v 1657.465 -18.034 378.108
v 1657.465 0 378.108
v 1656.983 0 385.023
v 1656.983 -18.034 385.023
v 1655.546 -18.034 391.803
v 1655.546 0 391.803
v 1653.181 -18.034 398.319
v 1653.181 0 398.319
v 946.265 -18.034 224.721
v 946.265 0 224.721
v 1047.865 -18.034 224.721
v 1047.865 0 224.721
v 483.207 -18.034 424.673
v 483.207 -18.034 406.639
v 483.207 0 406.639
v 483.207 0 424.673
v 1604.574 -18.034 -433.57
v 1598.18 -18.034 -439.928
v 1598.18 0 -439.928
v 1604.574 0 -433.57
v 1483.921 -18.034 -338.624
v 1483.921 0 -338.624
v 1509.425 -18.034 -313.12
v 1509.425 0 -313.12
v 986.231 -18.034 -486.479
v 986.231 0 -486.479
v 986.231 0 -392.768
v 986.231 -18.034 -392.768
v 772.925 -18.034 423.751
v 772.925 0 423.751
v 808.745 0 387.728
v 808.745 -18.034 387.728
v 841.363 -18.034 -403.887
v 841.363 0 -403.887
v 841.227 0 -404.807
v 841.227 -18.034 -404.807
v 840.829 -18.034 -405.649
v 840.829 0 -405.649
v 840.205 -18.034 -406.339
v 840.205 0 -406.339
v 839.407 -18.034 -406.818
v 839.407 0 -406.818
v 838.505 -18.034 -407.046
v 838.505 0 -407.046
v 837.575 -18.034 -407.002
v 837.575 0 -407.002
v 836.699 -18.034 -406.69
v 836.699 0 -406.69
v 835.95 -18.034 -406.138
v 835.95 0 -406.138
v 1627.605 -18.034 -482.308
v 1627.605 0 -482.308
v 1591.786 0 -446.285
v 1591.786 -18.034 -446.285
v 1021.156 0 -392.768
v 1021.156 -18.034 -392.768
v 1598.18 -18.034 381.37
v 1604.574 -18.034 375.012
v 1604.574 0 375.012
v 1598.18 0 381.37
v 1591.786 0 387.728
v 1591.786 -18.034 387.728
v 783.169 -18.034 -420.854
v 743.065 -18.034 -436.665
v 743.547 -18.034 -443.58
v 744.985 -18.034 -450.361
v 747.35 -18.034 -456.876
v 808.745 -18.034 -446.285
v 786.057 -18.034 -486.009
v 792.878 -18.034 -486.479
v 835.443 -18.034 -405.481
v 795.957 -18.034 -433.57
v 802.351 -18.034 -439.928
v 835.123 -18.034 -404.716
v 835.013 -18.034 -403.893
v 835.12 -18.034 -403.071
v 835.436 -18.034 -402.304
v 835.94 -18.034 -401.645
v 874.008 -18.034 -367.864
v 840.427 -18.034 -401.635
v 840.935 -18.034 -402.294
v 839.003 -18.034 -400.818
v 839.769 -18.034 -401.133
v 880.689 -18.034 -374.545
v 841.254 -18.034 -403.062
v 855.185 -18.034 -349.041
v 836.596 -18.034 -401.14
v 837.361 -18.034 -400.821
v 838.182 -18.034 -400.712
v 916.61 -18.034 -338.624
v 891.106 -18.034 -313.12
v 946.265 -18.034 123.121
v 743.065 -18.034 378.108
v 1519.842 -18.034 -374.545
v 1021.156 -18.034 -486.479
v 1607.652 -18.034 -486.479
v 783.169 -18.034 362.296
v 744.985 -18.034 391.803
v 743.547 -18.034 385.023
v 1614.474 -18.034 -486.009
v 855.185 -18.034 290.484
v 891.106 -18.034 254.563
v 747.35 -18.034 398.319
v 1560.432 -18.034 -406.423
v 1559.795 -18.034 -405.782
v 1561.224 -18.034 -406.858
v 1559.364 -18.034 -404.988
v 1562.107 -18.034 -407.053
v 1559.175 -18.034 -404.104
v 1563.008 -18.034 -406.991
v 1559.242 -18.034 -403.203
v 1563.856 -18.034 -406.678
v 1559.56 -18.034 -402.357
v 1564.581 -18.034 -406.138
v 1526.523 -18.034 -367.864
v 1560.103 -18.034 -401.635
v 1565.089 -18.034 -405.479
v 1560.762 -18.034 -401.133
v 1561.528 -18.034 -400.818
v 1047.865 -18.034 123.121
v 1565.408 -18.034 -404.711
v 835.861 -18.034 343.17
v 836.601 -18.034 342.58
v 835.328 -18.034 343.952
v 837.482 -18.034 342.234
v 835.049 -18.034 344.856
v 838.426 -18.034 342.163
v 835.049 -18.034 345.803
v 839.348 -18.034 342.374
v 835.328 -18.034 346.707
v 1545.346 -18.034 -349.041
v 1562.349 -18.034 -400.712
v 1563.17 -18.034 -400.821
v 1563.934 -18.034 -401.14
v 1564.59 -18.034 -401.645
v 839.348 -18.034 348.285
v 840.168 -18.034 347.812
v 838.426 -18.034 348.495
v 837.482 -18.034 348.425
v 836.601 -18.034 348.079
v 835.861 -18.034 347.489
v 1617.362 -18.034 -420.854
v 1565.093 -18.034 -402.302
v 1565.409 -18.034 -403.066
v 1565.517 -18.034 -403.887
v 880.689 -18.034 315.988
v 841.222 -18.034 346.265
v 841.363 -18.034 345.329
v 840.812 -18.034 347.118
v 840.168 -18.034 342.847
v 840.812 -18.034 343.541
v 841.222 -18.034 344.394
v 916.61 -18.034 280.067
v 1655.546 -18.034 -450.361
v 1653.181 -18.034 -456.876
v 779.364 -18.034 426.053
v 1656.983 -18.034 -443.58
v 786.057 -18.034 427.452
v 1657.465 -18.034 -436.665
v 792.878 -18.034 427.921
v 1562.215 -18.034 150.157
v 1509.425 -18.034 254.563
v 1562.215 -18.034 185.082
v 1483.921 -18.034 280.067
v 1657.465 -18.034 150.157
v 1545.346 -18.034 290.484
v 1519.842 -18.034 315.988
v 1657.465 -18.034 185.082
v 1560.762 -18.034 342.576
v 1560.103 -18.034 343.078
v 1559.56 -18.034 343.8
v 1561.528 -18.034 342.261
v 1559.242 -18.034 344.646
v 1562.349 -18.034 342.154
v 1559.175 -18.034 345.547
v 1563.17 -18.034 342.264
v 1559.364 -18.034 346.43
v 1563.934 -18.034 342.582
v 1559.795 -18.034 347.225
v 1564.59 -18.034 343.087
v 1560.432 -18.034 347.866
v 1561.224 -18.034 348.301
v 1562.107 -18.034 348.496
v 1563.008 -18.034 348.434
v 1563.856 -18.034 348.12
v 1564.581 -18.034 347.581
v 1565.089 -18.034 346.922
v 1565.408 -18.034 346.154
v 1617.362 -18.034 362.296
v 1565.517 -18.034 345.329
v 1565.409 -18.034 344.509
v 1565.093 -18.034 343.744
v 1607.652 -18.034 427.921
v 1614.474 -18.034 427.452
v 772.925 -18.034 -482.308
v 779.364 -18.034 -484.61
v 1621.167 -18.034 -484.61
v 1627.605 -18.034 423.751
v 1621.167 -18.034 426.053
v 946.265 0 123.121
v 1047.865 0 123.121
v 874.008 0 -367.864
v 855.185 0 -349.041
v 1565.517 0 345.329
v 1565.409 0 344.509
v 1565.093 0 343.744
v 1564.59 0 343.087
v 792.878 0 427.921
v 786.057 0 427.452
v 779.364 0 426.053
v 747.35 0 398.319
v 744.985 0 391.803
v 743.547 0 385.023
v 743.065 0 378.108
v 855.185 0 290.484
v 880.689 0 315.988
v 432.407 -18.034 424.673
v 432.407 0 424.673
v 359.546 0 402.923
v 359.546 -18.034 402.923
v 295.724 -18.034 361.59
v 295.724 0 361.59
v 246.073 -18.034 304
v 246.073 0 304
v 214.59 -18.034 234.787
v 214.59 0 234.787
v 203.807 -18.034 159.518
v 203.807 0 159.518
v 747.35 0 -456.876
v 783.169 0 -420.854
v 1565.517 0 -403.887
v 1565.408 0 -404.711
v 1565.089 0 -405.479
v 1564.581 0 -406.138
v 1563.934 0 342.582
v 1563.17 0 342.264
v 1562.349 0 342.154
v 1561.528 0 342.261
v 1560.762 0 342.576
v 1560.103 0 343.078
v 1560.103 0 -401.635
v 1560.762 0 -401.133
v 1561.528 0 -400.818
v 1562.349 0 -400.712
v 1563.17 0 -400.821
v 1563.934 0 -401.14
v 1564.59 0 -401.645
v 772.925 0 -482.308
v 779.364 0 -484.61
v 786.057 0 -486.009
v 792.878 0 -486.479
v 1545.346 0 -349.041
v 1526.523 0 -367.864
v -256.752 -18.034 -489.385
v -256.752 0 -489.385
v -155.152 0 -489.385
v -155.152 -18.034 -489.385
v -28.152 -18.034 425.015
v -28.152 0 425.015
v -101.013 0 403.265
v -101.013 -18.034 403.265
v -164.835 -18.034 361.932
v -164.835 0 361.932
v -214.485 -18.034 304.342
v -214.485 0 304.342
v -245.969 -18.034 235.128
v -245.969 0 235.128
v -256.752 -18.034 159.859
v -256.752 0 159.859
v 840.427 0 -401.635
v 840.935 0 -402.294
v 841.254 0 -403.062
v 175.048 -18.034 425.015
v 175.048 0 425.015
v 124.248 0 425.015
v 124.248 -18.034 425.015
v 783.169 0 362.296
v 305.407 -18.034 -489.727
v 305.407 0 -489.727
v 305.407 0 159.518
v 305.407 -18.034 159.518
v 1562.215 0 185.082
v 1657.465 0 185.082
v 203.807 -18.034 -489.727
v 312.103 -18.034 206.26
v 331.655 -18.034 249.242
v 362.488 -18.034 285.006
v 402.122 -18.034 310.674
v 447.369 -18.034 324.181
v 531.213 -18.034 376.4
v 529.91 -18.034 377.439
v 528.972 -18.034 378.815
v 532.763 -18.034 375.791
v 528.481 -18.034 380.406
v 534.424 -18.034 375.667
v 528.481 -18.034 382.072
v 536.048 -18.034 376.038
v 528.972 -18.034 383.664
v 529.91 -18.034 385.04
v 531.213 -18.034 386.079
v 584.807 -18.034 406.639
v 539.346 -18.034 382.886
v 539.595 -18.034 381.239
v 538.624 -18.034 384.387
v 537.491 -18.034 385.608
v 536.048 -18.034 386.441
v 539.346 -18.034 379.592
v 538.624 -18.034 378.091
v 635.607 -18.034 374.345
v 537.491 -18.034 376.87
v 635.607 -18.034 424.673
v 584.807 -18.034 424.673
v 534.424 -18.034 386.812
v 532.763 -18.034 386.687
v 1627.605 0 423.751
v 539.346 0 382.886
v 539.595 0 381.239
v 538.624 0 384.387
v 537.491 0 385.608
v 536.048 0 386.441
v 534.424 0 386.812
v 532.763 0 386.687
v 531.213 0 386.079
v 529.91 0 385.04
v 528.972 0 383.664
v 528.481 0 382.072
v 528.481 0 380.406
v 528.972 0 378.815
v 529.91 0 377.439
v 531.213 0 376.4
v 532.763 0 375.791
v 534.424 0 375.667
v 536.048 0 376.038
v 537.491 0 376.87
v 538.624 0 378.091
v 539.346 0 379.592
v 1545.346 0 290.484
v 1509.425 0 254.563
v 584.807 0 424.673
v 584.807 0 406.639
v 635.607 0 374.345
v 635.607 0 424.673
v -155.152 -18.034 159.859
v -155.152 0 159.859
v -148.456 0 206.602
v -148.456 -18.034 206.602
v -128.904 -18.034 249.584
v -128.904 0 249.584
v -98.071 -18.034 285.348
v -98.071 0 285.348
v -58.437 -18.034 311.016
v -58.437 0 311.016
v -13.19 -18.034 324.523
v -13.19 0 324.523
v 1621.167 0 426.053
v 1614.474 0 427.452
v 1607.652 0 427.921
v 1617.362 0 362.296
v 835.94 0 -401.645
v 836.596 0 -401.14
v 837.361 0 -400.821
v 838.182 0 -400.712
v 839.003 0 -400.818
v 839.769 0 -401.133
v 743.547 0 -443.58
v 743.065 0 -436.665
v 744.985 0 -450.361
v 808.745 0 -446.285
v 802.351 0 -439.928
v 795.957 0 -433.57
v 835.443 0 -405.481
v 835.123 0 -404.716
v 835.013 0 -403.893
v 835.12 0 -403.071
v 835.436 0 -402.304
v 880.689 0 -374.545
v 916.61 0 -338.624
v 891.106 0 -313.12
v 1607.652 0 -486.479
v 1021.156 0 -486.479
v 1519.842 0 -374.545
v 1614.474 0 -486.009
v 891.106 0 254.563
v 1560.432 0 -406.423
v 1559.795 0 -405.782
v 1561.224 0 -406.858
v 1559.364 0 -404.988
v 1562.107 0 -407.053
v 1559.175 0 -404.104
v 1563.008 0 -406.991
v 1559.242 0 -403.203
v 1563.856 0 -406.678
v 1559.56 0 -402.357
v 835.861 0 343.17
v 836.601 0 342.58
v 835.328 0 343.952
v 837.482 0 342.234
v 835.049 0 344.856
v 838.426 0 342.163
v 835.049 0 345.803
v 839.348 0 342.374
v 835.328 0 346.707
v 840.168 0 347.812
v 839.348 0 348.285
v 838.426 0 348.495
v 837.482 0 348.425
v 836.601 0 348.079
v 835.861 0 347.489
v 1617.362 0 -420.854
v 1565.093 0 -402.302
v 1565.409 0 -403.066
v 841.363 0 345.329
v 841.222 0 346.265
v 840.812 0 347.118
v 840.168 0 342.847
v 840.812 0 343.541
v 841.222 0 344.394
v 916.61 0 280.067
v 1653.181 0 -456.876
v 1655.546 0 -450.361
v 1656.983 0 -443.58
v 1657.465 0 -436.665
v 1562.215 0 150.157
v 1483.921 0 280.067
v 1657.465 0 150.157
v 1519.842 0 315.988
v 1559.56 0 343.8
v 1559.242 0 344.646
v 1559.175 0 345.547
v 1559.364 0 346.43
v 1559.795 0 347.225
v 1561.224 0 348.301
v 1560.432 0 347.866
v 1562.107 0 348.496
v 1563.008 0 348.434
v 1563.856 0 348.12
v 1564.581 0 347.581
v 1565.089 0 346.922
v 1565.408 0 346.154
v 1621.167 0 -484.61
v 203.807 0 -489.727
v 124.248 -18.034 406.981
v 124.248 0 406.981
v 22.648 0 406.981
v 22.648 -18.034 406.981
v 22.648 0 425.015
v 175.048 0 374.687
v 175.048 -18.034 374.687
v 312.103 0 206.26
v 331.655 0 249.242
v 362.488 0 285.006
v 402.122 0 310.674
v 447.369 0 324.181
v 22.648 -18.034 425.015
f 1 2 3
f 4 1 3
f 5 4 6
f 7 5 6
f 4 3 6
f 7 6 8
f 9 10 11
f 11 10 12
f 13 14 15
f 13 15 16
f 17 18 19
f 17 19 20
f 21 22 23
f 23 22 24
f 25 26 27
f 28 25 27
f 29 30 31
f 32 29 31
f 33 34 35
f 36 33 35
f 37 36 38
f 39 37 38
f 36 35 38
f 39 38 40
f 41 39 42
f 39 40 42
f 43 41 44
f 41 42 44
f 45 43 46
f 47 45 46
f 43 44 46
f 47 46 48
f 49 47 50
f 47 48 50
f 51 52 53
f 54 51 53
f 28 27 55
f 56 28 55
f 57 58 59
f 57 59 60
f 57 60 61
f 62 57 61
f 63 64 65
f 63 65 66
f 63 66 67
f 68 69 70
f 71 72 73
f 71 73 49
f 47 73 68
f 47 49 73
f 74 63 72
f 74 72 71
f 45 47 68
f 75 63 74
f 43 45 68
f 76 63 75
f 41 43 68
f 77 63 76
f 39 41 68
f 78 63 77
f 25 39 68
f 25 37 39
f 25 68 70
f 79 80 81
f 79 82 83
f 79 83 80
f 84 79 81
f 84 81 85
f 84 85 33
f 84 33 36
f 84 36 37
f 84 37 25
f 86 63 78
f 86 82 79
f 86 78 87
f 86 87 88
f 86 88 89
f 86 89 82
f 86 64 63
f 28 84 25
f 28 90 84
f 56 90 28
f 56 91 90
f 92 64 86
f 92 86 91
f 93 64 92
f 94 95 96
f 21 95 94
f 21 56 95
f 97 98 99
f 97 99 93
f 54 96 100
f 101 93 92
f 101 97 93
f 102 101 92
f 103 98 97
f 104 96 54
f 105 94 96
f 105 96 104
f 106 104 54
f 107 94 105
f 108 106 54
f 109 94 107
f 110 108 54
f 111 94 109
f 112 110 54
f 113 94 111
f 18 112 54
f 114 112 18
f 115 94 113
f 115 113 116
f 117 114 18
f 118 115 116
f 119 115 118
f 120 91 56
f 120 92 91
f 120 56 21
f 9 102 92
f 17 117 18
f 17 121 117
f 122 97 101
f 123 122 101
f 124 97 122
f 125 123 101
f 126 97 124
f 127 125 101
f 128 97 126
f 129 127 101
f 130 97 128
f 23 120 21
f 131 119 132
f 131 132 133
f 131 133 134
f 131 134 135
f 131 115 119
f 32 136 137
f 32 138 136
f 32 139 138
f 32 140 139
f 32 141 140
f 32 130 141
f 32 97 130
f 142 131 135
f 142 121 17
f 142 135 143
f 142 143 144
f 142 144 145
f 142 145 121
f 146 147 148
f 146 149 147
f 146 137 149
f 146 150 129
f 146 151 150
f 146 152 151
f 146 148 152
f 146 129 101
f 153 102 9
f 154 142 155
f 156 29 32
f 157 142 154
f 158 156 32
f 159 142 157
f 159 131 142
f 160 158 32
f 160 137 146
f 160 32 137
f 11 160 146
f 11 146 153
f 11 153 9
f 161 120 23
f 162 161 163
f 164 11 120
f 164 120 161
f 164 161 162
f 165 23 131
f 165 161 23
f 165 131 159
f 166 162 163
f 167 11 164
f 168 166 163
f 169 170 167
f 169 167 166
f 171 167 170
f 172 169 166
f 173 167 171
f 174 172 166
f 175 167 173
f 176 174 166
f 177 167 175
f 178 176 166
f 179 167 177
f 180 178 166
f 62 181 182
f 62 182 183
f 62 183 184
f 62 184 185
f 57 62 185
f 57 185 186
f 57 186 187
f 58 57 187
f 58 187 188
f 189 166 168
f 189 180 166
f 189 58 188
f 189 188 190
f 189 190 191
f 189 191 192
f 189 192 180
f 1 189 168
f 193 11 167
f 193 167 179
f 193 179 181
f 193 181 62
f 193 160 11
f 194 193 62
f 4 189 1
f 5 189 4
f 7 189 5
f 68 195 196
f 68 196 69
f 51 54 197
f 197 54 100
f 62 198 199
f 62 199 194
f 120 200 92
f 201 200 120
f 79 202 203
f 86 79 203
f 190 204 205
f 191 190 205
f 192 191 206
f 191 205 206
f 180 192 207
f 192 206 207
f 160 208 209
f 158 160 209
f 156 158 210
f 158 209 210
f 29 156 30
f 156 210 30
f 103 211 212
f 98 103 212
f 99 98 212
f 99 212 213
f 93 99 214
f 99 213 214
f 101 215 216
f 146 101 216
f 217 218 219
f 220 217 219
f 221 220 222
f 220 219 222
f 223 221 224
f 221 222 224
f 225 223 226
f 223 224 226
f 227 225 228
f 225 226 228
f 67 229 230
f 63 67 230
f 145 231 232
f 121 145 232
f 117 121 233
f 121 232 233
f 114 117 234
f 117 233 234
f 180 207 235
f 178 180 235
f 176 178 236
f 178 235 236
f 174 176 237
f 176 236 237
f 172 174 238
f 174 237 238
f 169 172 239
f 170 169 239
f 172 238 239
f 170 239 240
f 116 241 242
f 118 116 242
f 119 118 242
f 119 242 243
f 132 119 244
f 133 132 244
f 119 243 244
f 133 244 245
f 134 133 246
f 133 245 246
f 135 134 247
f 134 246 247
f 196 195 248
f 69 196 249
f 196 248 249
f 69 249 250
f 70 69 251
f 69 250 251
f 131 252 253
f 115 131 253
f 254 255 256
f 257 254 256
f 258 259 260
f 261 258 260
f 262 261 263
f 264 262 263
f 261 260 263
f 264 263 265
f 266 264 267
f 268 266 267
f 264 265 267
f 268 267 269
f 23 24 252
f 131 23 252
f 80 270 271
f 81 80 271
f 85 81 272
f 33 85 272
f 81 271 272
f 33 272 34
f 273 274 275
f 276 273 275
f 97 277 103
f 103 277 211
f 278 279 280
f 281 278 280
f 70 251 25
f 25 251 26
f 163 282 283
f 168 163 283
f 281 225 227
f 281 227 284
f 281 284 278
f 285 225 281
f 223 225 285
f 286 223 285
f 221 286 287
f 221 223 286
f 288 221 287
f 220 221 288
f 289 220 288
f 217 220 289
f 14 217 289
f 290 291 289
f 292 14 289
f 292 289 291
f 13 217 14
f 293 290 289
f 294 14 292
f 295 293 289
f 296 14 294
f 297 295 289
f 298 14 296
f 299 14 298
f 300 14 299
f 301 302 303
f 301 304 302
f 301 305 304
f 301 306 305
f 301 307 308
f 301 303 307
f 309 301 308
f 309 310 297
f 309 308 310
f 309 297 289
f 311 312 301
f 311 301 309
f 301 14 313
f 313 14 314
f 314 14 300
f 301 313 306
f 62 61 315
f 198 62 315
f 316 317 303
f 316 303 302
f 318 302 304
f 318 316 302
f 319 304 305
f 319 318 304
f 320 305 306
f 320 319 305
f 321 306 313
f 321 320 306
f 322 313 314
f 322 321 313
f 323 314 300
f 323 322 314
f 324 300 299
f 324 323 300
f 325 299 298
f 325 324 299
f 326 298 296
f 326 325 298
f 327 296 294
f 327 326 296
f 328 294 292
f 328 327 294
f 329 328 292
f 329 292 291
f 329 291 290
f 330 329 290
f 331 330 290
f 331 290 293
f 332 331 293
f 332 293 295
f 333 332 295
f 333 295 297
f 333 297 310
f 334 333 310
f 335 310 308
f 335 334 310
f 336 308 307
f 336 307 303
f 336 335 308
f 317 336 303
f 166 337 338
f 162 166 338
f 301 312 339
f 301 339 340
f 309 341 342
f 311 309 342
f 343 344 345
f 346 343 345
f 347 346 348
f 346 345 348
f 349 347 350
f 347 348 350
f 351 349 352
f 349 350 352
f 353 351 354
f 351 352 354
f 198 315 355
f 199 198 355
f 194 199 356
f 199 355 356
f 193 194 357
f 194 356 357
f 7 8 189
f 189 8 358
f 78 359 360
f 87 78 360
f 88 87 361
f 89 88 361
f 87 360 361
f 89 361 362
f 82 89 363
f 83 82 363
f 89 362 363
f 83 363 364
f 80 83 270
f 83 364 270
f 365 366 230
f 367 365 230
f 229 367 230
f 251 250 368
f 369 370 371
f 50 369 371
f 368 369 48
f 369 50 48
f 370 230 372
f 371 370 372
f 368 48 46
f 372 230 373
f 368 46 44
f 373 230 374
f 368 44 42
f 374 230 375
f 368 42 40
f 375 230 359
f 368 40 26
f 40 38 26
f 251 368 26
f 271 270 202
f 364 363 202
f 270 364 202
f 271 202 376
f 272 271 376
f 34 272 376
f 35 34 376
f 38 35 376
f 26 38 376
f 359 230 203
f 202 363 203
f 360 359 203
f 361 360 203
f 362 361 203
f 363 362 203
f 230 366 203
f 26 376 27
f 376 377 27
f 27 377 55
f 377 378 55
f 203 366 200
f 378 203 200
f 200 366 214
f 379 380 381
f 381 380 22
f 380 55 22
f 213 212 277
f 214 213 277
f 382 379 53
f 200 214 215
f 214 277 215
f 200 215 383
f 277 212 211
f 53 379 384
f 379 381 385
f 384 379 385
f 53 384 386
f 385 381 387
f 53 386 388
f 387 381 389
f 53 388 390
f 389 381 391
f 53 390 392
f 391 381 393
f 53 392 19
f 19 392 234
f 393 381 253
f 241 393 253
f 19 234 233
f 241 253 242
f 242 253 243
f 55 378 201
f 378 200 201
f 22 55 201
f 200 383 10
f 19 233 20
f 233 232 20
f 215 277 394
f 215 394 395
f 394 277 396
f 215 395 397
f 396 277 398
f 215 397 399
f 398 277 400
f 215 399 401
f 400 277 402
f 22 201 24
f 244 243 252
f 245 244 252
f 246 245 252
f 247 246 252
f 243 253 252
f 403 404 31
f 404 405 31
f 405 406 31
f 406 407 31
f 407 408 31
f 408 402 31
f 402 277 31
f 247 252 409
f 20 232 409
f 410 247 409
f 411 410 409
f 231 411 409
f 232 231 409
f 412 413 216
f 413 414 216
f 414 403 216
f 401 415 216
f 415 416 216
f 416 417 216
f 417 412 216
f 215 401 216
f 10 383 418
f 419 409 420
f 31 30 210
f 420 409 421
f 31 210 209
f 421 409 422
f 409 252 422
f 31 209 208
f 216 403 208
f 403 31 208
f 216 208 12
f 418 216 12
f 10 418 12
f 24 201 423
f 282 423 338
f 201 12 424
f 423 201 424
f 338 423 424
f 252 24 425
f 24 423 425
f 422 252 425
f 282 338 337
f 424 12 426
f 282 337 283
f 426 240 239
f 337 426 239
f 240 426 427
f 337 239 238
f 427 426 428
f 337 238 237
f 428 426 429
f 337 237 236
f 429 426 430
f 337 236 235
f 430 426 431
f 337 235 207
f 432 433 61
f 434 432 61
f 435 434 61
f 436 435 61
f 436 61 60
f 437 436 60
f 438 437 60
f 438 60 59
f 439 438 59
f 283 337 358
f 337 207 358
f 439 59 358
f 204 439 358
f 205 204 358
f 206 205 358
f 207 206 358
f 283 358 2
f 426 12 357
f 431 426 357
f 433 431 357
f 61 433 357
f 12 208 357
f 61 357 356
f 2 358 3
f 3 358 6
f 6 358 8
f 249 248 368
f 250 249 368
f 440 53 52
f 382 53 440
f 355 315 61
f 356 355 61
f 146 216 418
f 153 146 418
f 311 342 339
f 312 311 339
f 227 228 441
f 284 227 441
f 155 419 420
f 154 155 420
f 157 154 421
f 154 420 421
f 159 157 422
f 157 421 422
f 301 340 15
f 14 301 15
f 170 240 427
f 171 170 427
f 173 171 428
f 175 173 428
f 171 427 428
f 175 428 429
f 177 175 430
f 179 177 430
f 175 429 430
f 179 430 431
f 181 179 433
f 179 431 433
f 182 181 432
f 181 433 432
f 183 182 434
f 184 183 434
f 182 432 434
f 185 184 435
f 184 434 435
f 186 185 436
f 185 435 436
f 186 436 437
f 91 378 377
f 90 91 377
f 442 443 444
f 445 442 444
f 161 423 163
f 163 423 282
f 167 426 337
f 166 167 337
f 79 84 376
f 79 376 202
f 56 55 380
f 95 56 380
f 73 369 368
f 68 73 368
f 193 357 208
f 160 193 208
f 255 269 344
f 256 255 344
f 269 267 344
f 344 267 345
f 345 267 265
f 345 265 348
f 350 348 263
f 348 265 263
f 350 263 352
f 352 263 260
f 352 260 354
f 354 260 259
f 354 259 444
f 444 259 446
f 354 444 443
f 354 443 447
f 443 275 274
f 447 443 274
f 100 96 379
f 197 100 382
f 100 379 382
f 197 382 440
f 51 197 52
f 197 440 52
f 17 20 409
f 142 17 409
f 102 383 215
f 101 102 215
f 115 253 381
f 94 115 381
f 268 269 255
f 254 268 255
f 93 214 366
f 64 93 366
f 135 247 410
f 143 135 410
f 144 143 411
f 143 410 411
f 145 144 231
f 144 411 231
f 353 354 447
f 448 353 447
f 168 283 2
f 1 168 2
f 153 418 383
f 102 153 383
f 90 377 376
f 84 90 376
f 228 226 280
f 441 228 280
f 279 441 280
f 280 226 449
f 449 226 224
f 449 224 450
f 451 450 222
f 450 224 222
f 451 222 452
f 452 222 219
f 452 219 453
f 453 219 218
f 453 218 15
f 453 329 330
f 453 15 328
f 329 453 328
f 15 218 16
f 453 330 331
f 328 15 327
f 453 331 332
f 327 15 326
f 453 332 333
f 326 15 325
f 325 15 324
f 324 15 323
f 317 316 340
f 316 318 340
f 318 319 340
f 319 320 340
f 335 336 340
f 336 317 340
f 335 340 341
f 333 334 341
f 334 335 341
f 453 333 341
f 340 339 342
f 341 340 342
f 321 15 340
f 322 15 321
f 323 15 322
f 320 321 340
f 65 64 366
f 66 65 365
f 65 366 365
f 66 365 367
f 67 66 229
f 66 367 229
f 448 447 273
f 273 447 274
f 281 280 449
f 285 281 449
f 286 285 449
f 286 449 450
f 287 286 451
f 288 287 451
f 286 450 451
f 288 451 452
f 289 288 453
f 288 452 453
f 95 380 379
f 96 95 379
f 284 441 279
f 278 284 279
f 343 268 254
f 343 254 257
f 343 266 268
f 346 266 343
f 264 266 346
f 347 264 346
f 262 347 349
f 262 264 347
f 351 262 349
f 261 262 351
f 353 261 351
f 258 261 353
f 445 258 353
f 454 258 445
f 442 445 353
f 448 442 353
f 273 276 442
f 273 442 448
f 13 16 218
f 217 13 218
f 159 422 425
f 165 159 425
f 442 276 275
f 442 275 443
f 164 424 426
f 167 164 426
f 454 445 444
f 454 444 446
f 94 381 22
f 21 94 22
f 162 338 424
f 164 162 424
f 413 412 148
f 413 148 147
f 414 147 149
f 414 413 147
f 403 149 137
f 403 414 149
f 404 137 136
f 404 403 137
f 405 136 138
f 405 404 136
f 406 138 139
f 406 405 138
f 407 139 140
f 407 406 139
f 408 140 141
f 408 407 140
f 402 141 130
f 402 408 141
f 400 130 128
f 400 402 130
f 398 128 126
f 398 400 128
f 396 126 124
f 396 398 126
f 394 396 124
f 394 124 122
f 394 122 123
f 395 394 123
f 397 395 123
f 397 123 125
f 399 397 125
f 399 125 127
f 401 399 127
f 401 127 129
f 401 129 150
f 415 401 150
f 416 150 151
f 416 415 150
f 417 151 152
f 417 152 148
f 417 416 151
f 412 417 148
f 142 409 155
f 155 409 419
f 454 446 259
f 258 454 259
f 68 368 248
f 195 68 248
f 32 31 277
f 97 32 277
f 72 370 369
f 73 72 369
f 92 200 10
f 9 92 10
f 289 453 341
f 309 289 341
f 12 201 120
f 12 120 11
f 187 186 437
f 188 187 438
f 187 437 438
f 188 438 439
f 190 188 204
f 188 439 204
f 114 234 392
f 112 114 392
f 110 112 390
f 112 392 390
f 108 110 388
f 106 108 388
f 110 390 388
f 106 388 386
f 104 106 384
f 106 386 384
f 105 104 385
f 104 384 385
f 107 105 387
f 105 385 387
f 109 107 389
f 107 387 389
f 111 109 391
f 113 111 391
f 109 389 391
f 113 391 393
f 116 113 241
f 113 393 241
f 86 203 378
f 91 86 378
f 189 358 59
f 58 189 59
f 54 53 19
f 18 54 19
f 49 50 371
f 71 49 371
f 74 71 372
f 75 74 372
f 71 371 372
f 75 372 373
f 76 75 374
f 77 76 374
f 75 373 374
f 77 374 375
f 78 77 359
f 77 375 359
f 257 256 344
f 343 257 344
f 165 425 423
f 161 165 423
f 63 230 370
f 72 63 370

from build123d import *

# Parameters (mm, degrees)
F0_R     = 5.588
F1_DEPTH = 18.034
F0_W     = 101.6
F0_H     = 101.6
F0_R_2   = 3.175


# Not quite as in the source:
# - a feature names something its author has since deleted; it is built from what else it names


with BuildPart() as f1:
    # F0 (on Front) → F1 (new body)
    with BuildSketch(Plane.XZ):
        with BuildLine():
            Line((483.2065144254, 424.6733268274), (432.4065144254, 424.6733268274))
            ThreePointArc((432.4065144254, 424.6733268274), (268.8463203697, 334.5643709124), (203.8065144254, 159.5175638624))
            Line((203.8065144254, 159.5175638624), (203.8065144254, -489.7266731726))
            Line((203.8065144254, -489.7266731726), (305.4065144254, -489.7266731726))
            Line((305.4065144254, -489.7266731726), (305.4065144254, 159.5175638624))
            ThreePointArc((305.4065144254, 159.5175638624), (345.7966685973, 268.2228009306), (447.3686422275, 324.1810647789))
            Line((447.3686422275, 324.1810647789), (635.6065144254, 374.3450939655))
            Line((635.6065144254, 374.3450939655), (635.6065144254, 406.6393268274))
            Line((635.6065144254, 406.6393268274), (635.6065144254, 424.6733268274))
            Line((635.6065144254, 424.6733268274), (584.8065144254, 424.6733268274))
            Line((584.8065144254, 424.6733268274), (584.8065144254, 406.6393268274))
            Line((584.8065144254, 406.6393268274), (483.2065144254, 406.6393268274))
            Line((483.2065144254, 406.6393268274), (483.2065144254, 424.6733268274))
        make_face()
        with Locations((534.0065144254, 381.2393268274)):
            Circle(F0_R, mode=Mode.SUBTRACT)
    extrude(amount=F1_DEPTH)


with BuildPart() as f1b:
    # F0 (on Front) → F1, piece 2 (new body)
    with BuildSketch(Plane.XZ):
        with BuildLine():
            Line((1607.6519874032, 427.9213663064), (792.8783607687, 427.9213663064))
            ThreePointArc((792.8783607687, 427.9213663064), (782.6863062078, 426.8675437634), (772.9254875333, 423.7506644064))
            Line((772.9254875333, 423.7506644064), (808.7447410617, 387.7281564889))
            Line((808.7447410617, 387.7281564889), (795.956750751, 375.0123214863))
            Line((795.956750751, 375.0123214863), (783.1687604403, 362.2964864837))
            Line((783.1687604403, 362.2964864837), (747.3495069119, 398.3189944012))
            ThreePointArc((747.3495069119, 398.3189944012), (744.1480269708, 388.4381426165), (743.0651740859, 378.1081796236))
            Line((743.0651740859, 378.1081796236), (743.0651740859, -436.6654470109))
            ThreePointArc((743.0651740859, -436.6654470109), (744.1480269708, -446.9954100037), (747.3495069119, -456.8762617884))
            Line((747.3495069118, -456.8762617884), (783.1687604403, -420.8537538709))
            Line((783.1687604403, -420.8537538709), (795.956750751, -433.5695888735))
            Line((795.956750751, -433.5695888735), (802.3507459063, -439.9275063748))
            Line((802.3507459063, -439.9275063748), (808.7447410617, -446.2854238761))
            Line((808.7447410617, -446.2854238761), (772.9254875333, -482.3079317936))
            ThreePointArc((772.9254875333, -482.3079317936), (782.6863062078, -485.4248111507), (792.8783607687, -486.4786336936))
            Line((792.8783607687, -486.4786336936), (986.2313252449, -486.4786336936))
            Line((986.2313252449, -486.4786336936), (986.2313252449, -392.7684829235))
            Line((986.2313252449, -392.7684829235), (1021.1563252449, -392.7684829235))
            Line((1021.1563252449, -392.7684829235), (1021.1563252449, -486.4786336936))
            Line((1021.1563252449, -486.4786336936), (1607.6519874032, -486.4786336936))
            ThreePointArc((1607.6519874032, -486.4786336936), (1617.8440419641, -485.4248111507), (1627.6048606386, -482.3079317936))
            Line((1627.6048606386, -482.3079317936), (1591.7856071102, -446.2854238761))
            Line((1591.7856071102, -446.2854238761), (1598.1796022655, -439.9275063748))
            Line((1598.1796022655, -439.9275063748), (1604.5735974209, -433.5695888735))
            Line((1604.5735974209, -433.5695888735), (1617.3615877316, -420.8537538709))
            Line((1617.3615877316, -420.8537538709), (1653.18084126, -456.8762617884))
            ThreePointArc((1653.18084126, -456.8762617884), (1656.3823212011, -446.9954100037), (1657.4651740859, -436.6654470109))
            Line((1657.4651740859, -436.6654470109), (1657.4651740859, 150.1565170765))
            Line((1657.4651740859, 150.1565170765), (1562.2151740859, 150.1565170765))
            Line((1562.2151740859, 150.1565170765), (1562.2151740859, 185.0815170765))
            Line((1562.2151740859, 185.0815170765), (1657.4651740859, 185.0815170765))
            Line((1657.4651740859, 185.0815170765), (1657.4651740859, 378.1081796236))
            ThreePointArc((1657.4651740859, 378.1081796236), (1656.3823212011, 388.4381426165), (1653.18084126, 398.3189944012))
            Line((1653.18084126, 398.3189944012), (1617.3615877316, 362.2964864837))
            Line((1617.3615877316, 362.2964864837), (1604.5735974209, 375.0123214863))
            Line((1604.5735974209, 375.0123214863), (1598.1796022655, 381.3702389876))
            Line((1598.1796022655, 381.3702389876), (1591.7856071102, 387.7281564889))
            Line((1591.7856071102, 387.7281564889), (1627.6048606386, 423.7506644064))
            ThreePointArc((1627.6048606386, 423.7506644064), (1617.8440419641, 426.8675437634), (1607.6519874032, 427.9213663064))
        make_face()
        with BuildLine():
            ThreePointArc((841.3632739356, -403.8866202588), (839.4074420696, -406.8182160804), (835.9495705901, -406.1380270037))
            ThreePointArc((835.9495705901, -406.1380270037), (835.0132810832, -403.8933572576), (835.9400362986, -401.6447343278))
            ThreePointArc((835.9400362986, -401.6447343278), (838.1815369368, -400.7116274064), (840.4269772811, -401.635213514))
            ThreePointArc((840.4269772811, -401.635213514), (841.1198697572, -402.6674521248), (841.3632739356, -403.8866202588))
        make_face(mode=Mode.SUBTRACT)
        Polygon((880.6885609861, -374.5448583408), (874.0076708186, -367.8639681733), (855.1846336023, -349.0409309569), (891.1056580866, -313.1199064727), (916.6095854704, -338.6238338565), align=None, mode=Mode.SUBTRACT)
        with BuildLine():
            ThreePointArc((1565.5170742363, -403.8866202588), (1565.2736700579, -405.1057883928), (1564.5807775818, -406.1380270037))
            ThreePointArc((1564.5807775818, -406.1380270037), (1560.0906674915, -406.1253236043), (1560.1033708908, -401.635213514))
            ThreePointArc((1560.1033708908, -401.635213514), (1562.3488112351, -400.7116274064), (1564.5903118733, -401.6447343278))
            ThreePointArc((1564.5903118733, -401.6447343278), (1565.2762503981, -402.6736753915), (1565.5170742363, -403.8866202588))
        make_face(mode=Mode.SUBTRACT)
        Polygon((1545.3457145696, -349.0409309569), (1526.5226773533, -367.8639681733), (1519.8417871858, -374.5448583408), (1483.9207627015, -338.6238338565), (1509.4246900853, -313.1199064727), align=None, mode=Mode.SUBTRACT)
        with Locations((997.0651740859, 173.9213663064)):
            Rectangle(F0_W, F0_H, mode=Mode.SUBTRACT)
        Polygon((891.1056580866, 254.5626390854), (855.1846336023, 290.4836635697), (880.6885609861, 315.9875909535), (916.6095854704, 280.0665664693), align=None, mode=Mode.SUBTRACT)
        with Locations((838.1882739356, 345.3293528716)):
            Circle(F0_R_2, mode=Mode.SUBTRACT)
        Polygon((1519.8417871858, 315.9875909535), (1526.5226773533, 309.306700786), (1545.3457145696, 290.4836635697), (1509.4246900853, 254.5626390854), (1483.9207627015, 280.0665664693), align=None, mode=Mode.SUBTRACT)
        with BuildLine():
            ThreePointArc((1560.1033708908, 343.0779461267), (1560.0906674915, 347.5680562171), (1564.5807775818, 347.5807596164))
            ThreePointArc((1564.5807775818, 347.5807596164), (1565.2736700579, 346.5485210056), (1565.5170742363, 345.3293528716))
            ThreePointArc((1565.5170742363, 345.3293528716), (1565.2762503981, 344.1164080042), (1564.5903118733, 343.0874669406))
            ThreePointArc((1564.5903118733, 343.0874669406), (1562.3488112351, 342.1543600192), (1560.1033708908, 343.0779461267))
        make_face(mode=Mode.SUBTRACT)
    extrude(amount=F1_DEPTH)


with BuildPart() as f1c:
    # F0 (on Front) → F1, piece 3 (new body)
    with BuildSketch(Plane.XZ):
        with BuildLine():
            Line((-256.7524378796, 159.8593657013), (-256.7524378796, -489.3848713337))
            Line((-256.7524378796, -489.3848713337), (-155.1524378796, -489.3848713337))
            Line((-155.1524378796, -489.3848713337), (-155.1524378796, 159.8593657013))
            ThreePointArc((-155.1524378796, 159.8593657013), (-114.7622837077, 268.5646027694), (-13.1903100775, 324.5228666178))
            Line((-13.1903100775, 324.5228666178), (175.0475621204, 374.6868958044))
            Line((175.0475621204, 374.6868958044), (175.0475621204, 406.9811286663))
            Line((175.0475621204, 406.9811286663), (175.0475621204, 425.0151286663))
            Line((175.0475621204, 425.0151286663), (124.2475621204, 425.0151286663))
            Line((124.2475621204, 425.0151286663), (124.2475621204, 406.9811286663))
            Line((124.2475621204, 406.9811286663), (22.6475621204, 406.9811286663))
            Line((22.6475621204, 406.9811286663), (22.6475621204, 425.0151286663))
            Line((22.6475621204, 425.0151286663), (-28.1524378796, 425.0151286663))
            ThreePointArc((-28.1524378796, 425.0151286663), (-191.7126319353, 334.9061727512), (-256.7524378796, 159.8593657013))
        make_face()
    extrude(amount=F1_DEPTH)


solid = Compound([f1.part, f1b.part, f1c.part])
